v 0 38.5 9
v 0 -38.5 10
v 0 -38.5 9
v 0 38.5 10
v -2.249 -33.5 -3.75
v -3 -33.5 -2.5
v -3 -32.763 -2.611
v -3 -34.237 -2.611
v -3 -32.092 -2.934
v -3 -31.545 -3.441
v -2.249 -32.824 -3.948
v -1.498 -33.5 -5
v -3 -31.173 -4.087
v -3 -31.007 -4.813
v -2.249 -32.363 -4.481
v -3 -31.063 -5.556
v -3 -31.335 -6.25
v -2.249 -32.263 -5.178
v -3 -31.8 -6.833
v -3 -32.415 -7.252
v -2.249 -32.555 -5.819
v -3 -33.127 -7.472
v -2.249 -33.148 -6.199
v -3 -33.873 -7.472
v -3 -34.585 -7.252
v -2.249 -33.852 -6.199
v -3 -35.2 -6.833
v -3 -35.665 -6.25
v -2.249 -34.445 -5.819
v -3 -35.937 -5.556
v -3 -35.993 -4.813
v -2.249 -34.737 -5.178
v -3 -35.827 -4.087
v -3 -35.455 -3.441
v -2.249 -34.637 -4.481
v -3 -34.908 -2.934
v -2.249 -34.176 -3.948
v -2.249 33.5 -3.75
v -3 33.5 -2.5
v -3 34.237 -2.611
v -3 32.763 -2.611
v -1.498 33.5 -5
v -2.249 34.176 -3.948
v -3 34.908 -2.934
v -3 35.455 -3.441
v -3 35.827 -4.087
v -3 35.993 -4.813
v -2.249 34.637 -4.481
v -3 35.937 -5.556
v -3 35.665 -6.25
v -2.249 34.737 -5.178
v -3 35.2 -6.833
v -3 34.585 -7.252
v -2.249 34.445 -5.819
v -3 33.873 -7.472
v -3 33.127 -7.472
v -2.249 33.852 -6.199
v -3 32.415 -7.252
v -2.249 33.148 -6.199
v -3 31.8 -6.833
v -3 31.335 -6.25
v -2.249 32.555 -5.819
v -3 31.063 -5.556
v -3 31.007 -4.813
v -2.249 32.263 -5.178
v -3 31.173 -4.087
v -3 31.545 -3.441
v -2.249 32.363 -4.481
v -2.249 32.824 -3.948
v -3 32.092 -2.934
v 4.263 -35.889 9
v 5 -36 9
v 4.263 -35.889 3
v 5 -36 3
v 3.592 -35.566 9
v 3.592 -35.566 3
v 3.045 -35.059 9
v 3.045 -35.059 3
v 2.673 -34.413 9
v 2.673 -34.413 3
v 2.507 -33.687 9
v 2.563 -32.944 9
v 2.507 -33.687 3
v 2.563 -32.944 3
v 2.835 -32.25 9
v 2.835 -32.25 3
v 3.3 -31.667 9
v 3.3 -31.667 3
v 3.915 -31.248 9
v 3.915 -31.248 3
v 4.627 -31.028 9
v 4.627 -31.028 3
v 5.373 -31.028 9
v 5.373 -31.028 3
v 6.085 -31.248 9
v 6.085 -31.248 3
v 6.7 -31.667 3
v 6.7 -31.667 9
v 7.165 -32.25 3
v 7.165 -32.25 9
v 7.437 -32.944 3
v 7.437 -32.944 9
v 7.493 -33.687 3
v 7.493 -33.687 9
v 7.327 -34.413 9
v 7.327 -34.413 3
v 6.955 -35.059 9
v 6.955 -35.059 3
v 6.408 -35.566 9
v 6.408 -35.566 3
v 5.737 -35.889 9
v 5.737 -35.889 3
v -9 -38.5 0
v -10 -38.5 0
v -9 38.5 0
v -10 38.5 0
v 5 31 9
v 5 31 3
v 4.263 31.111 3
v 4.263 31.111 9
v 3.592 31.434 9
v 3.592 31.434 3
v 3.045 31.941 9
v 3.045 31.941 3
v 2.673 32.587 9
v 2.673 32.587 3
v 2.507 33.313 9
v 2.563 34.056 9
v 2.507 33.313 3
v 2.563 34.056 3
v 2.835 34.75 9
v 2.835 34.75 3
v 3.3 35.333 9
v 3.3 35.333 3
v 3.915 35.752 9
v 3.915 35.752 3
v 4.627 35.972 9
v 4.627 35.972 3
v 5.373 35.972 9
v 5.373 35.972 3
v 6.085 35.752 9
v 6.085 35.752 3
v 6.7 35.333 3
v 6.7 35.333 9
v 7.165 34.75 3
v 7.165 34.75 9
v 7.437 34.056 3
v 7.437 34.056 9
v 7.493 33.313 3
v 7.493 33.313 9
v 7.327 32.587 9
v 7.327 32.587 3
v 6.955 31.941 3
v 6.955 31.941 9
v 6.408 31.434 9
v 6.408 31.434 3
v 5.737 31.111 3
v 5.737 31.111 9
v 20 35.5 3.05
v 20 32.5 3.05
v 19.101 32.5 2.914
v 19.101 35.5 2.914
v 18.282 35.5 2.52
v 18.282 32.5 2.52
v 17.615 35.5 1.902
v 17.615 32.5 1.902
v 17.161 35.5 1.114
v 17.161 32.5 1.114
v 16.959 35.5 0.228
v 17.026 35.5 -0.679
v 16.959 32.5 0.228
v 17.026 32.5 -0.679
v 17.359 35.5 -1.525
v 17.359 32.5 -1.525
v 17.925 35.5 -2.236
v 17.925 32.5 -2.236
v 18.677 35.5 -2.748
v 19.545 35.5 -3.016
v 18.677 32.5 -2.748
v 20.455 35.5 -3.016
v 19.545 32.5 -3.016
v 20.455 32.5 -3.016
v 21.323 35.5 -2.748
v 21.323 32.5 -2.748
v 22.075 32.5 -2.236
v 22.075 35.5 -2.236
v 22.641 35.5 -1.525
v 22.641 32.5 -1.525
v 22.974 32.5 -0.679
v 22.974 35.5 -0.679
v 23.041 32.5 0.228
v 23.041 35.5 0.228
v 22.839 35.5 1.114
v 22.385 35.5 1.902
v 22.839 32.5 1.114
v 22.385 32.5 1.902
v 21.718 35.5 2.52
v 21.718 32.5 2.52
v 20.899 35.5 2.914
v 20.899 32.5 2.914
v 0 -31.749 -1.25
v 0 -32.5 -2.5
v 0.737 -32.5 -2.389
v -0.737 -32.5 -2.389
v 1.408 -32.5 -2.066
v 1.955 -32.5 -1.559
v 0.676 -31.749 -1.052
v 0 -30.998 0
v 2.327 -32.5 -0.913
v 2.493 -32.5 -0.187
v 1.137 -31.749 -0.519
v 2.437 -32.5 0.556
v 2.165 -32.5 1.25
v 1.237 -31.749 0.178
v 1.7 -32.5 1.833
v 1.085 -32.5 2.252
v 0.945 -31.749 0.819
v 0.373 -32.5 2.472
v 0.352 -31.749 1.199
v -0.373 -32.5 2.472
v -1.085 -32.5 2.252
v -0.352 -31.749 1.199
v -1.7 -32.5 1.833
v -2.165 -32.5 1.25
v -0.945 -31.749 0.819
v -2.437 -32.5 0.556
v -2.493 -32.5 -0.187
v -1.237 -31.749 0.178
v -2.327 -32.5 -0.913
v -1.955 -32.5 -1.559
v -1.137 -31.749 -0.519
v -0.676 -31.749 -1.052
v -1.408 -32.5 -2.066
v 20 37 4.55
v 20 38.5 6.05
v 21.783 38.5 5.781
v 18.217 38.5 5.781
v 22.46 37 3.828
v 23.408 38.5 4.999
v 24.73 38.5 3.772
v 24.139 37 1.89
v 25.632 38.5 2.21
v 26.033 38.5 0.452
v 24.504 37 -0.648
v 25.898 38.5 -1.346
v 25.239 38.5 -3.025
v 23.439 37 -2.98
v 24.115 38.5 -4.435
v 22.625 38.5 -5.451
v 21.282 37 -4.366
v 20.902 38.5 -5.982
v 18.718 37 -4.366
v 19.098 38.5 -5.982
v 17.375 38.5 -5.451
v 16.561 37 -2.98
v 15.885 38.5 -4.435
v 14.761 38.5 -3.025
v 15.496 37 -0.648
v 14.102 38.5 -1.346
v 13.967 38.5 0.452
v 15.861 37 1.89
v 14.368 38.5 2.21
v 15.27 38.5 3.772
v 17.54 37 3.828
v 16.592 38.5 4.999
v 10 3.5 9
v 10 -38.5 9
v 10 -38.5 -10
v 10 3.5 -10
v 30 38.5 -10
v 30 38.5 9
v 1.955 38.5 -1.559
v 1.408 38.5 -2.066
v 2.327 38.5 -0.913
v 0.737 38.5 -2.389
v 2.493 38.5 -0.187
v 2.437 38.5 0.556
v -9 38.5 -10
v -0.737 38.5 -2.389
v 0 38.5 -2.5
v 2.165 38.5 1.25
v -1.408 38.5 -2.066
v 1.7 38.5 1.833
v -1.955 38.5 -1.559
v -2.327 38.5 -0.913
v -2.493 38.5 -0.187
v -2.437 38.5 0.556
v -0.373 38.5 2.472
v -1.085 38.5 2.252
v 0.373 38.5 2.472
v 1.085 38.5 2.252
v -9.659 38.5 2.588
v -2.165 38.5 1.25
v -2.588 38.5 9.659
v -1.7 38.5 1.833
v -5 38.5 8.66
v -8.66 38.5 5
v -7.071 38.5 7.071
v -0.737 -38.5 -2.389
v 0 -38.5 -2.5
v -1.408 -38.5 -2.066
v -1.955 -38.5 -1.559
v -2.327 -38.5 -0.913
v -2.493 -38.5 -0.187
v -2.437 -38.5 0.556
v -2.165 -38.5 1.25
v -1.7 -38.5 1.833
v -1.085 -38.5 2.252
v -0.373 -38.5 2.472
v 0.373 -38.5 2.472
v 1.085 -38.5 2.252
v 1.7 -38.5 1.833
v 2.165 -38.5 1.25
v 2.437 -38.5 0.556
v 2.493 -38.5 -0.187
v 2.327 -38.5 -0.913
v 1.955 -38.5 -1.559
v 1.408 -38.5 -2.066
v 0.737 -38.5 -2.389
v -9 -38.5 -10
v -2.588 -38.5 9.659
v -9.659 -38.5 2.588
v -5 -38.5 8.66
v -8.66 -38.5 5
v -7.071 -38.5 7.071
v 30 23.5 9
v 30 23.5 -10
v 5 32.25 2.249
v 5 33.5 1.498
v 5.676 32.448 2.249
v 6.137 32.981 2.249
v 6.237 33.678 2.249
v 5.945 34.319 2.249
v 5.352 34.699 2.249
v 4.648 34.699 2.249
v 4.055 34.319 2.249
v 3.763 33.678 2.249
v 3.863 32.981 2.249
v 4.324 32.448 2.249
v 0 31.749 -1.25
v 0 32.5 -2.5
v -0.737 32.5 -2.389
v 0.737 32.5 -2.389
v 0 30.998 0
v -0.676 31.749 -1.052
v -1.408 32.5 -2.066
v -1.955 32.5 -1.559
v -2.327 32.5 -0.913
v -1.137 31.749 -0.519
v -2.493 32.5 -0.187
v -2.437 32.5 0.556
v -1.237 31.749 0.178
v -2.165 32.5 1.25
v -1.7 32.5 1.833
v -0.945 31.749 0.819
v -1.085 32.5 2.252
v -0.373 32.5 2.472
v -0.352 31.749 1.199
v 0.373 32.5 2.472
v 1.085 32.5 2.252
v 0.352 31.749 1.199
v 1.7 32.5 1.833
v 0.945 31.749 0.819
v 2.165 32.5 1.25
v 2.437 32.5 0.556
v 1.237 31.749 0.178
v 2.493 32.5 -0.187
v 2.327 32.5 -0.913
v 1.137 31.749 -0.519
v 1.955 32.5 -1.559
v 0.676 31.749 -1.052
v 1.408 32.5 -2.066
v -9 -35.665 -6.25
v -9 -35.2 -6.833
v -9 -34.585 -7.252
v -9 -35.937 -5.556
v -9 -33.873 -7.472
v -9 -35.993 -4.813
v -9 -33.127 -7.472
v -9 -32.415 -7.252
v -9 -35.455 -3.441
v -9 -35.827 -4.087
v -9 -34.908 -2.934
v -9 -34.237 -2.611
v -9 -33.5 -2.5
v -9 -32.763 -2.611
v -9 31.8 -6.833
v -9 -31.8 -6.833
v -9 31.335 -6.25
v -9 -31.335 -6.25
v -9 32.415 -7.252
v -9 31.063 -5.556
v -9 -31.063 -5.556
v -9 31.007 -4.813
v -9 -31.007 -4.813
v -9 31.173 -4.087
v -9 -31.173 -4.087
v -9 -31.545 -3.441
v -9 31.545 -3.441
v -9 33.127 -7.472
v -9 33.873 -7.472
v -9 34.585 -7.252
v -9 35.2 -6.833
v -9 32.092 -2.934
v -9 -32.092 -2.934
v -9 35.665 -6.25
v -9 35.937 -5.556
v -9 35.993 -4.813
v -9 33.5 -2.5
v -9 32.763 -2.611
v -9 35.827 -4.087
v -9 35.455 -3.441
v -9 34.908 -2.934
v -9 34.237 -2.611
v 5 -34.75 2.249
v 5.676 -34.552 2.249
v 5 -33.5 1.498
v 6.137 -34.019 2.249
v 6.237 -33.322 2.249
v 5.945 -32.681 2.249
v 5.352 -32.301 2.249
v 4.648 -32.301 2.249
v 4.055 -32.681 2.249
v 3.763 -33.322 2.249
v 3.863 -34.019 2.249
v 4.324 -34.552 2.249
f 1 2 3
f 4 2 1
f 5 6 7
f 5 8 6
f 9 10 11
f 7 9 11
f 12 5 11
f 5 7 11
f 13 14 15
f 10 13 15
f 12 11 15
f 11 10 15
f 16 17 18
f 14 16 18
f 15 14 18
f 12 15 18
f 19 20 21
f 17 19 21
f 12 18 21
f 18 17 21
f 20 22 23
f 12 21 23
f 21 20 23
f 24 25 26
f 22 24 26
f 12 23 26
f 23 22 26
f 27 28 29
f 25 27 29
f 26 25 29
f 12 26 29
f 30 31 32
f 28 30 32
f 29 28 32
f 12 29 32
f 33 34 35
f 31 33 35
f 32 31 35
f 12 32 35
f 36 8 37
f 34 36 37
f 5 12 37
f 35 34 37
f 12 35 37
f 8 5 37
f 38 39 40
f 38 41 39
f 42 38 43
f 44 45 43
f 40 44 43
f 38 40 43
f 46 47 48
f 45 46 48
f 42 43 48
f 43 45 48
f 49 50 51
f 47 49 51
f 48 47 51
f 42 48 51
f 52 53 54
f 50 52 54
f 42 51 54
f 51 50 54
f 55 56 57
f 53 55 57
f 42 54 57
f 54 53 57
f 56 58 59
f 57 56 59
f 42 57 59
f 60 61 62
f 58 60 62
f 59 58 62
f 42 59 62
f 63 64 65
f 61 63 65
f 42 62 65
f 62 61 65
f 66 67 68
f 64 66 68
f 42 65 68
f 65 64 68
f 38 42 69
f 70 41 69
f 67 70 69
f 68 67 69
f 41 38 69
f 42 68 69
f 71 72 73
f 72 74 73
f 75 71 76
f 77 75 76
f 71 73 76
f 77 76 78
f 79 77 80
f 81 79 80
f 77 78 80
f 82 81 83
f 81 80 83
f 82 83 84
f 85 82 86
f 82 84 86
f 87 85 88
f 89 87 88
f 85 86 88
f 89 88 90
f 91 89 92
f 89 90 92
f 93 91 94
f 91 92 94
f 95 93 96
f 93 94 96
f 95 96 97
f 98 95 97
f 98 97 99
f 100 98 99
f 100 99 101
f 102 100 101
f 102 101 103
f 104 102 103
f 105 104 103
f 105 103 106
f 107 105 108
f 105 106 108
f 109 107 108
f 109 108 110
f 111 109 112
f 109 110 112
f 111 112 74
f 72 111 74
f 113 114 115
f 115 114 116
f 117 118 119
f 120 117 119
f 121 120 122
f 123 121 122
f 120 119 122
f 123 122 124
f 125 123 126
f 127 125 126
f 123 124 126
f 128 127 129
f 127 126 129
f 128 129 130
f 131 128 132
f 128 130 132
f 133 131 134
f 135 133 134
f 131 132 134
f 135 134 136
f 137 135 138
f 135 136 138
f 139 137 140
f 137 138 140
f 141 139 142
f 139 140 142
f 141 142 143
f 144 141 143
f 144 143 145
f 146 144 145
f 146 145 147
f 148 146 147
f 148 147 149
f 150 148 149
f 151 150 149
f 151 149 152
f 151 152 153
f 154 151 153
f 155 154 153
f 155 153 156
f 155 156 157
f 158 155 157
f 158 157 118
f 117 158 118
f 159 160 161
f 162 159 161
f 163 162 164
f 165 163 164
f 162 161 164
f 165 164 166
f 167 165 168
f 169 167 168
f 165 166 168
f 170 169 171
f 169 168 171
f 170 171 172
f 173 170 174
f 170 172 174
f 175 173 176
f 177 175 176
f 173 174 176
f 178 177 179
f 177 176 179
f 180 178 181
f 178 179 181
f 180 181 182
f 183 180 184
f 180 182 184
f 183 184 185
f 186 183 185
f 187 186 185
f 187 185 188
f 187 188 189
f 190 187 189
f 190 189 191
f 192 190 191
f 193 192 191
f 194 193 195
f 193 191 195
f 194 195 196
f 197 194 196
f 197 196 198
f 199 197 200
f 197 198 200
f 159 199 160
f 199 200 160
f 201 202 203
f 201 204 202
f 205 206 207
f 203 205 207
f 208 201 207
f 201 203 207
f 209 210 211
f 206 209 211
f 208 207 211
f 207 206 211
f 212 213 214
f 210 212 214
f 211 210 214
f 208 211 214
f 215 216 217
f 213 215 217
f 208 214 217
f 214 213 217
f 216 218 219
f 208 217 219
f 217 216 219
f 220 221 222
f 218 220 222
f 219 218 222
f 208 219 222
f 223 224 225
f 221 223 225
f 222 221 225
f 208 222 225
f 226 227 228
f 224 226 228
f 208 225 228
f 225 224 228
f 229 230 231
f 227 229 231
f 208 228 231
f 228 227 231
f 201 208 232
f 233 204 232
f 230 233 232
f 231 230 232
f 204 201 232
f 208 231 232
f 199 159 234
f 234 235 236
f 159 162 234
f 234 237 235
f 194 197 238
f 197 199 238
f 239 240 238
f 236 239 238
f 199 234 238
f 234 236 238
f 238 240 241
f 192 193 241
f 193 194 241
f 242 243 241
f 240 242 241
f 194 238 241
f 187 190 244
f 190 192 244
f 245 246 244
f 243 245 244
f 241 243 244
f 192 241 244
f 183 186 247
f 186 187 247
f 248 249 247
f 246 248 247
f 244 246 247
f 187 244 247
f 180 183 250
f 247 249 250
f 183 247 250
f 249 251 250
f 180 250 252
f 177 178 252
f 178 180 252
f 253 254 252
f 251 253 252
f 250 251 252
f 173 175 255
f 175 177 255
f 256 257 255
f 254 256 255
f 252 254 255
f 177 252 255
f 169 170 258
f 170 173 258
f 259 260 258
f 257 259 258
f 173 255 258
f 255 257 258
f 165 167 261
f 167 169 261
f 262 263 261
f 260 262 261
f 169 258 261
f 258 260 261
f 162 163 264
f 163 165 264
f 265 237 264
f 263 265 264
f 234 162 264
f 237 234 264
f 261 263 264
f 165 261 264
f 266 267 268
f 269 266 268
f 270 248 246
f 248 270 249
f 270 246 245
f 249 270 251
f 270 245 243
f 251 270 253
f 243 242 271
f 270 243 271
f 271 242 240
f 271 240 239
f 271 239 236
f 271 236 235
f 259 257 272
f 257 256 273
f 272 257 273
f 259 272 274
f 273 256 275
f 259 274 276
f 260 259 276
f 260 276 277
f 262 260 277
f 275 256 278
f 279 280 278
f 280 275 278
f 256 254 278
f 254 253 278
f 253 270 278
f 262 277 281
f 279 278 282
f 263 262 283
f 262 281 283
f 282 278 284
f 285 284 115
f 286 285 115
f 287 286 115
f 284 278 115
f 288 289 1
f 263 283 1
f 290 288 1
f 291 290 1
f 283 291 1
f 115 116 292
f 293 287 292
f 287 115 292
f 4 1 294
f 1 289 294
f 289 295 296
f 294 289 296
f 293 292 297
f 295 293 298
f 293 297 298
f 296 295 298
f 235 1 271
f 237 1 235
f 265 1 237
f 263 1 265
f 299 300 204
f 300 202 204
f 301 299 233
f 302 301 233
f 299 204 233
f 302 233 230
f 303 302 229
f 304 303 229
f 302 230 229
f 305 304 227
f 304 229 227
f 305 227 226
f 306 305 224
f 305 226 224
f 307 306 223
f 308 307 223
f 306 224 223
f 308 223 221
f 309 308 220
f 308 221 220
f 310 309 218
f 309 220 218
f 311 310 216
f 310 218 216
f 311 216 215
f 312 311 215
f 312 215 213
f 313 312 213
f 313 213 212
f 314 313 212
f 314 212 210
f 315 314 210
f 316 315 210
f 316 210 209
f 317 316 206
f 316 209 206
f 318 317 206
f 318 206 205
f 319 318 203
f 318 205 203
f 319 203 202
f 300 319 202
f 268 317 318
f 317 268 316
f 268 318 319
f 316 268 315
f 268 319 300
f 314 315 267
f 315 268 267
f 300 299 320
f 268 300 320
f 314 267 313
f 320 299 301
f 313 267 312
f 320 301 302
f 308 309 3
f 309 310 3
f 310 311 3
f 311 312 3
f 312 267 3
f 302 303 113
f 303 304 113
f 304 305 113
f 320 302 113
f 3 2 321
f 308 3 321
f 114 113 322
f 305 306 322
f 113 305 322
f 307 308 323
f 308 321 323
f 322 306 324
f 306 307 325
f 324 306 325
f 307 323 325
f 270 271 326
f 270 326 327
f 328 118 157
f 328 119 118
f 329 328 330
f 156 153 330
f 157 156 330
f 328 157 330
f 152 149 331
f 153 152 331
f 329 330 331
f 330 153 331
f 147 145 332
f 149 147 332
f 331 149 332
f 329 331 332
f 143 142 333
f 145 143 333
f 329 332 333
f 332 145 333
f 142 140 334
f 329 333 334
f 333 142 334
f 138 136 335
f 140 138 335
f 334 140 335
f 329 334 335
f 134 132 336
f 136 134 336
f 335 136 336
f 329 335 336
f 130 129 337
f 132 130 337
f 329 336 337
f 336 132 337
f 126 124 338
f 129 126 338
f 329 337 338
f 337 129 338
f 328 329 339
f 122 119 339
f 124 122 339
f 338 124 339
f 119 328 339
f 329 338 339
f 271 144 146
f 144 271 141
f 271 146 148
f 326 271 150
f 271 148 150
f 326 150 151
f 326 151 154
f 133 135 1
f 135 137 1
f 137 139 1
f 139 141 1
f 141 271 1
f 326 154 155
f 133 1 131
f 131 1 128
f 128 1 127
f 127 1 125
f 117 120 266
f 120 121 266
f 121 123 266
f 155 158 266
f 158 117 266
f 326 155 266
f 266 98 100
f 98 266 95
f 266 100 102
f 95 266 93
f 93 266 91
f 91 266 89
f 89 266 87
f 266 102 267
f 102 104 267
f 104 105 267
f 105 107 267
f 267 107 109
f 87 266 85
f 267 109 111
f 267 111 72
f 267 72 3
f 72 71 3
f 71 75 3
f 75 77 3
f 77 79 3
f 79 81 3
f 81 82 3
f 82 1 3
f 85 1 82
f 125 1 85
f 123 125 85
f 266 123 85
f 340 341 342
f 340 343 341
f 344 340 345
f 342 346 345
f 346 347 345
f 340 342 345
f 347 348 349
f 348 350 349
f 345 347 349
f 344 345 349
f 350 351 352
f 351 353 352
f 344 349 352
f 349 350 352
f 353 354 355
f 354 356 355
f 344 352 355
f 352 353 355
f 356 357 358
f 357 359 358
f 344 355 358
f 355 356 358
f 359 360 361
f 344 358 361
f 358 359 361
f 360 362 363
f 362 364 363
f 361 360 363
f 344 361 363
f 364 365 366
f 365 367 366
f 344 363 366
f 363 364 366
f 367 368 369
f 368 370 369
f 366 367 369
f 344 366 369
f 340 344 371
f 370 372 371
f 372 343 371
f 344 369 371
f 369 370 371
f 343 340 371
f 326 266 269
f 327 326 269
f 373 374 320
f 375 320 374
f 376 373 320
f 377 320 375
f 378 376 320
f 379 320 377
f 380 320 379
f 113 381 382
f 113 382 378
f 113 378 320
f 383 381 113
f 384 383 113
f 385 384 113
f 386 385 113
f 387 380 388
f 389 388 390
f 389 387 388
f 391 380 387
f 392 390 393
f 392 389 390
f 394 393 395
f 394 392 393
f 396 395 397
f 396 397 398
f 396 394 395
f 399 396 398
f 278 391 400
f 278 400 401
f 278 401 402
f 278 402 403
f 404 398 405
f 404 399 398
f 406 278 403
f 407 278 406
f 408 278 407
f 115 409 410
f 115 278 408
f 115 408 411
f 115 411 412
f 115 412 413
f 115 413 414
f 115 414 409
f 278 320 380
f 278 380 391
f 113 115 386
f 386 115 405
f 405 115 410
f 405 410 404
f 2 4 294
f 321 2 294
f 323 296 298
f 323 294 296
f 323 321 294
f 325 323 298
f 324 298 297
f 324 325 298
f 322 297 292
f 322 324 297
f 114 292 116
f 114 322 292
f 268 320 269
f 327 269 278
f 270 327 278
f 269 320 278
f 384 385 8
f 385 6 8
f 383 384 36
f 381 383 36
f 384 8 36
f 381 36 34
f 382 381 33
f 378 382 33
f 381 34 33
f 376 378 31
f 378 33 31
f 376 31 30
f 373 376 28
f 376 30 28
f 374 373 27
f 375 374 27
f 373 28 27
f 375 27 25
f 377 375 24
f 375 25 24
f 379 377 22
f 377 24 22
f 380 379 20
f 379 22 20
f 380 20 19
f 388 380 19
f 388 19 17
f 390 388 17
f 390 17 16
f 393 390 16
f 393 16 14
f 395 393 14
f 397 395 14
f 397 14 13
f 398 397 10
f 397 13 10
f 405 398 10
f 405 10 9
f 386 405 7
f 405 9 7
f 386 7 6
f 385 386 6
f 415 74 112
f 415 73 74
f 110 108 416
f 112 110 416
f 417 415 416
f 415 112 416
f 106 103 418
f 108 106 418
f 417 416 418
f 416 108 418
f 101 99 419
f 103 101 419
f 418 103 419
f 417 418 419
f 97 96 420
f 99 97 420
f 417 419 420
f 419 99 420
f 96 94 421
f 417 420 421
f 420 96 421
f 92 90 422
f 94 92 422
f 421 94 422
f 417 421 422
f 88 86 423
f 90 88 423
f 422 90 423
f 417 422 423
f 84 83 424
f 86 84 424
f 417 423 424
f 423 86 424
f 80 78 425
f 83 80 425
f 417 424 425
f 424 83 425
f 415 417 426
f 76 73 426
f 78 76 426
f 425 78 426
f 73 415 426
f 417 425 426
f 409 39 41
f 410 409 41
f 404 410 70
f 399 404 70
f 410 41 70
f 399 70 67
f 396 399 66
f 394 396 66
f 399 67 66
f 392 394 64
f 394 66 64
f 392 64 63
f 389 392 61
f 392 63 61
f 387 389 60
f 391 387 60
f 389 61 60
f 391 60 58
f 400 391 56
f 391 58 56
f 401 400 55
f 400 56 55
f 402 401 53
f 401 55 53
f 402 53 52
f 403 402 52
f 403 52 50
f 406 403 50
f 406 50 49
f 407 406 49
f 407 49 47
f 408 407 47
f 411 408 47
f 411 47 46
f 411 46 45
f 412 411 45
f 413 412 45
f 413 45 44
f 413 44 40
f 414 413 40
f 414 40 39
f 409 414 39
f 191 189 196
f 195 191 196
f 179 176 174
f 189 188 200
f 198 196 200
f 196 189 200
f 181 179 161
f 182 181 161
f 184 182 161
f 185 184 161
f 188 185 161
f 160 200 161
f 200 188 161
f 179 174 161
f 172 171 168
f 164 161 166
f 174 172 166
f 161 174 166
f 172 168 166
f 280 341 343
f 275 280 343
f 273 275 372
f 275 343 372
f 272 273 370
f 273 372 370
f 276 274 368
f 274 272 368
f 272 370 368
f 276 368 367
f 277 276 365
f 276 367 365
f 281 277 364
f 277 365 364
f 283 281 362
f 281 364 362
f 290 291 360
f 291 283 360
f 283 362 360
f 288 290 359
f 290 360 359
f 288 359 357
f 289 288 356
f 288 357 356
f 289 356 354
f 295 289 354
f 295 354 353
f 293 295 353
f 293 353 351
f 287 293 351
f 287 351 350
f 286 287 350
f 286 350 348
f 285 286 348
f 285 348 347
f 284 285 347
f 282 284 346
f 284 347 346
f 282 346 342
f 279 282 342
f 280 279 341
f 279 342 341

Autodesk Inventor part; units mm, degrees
ref_plane "YZ Plane" through (0, 0, 0) normal (1, 0, 0) x (0, 1, 0)
ref_plane "XZ Plane" through (0, 0, 0) normal (0, 1, 0) x (-1, 0, 0)
ref_plane "XY Plane" through (0, 0, 0) normal (0, 0, 1) x (1, 0, 0)
sketch "スケッチ1" plane through (0, 0, 0) normal (0, 1, 0) x (-1, 0, 0)
  circle A0 centre (0, 0) radius 10
  line L0 (0, 10) -> (-10, 10)
  line L1 (-10, 10) -> (-10, -10)
  line L2 (-10, -10) -> (10, -10)
  line L3 (10, -10) -> (10, 0)
  dimension "d0" = 20
  dimension "d1" = 10
  dimension "d2" = 10
extrude "押し出し1" add sketch "スケッチ1" along normal mid plane 77
sketch "スケッチ2" plane through (0, -38.5, 10) normal (0, 0, 1) x (1, 0, 0)
  line L0 (10, 0) -> (10, 77) projected
  line L1 (0, 77) -> (10, 77) projected
  line L2 (0, 0) -> (0, 77) projected
  line L3 (10, 0) -> (0, 0) projected
extrude "押し出し2" cut sketch "スケッチ2" against normal blind 1
sketch "スケッチ3" plane through (-10, -38.5, -10) normal (-1, 0, 0) x (0, 0, 1)
  line L0 (0, 77) -> (10, 77) projected
  line L1 (10, 0) -> (10, 77) projected
  line L2 (10, 0) -> (0, 0) projected
  line L3 (0, 0) -> (0, 77) projected
  point P0 (10, 38.5)
extrude "押し出し3" cut sketch "スケッチ3" against normal blind 1
sketch "スケッチ4" plane through (0, -38.5, 9) normal (0, 0, 1) x (1, 0, 0)
  line L0 (0, 77) -> (10, 77) projected
  line L1 (10, 77) -> (10, 0) projected
  line L2 (10, 0) -> (0, 0) projected
  point P0 (0, 38.5)
  point P1 (5, 72)
  point P2 (5, 5)
  dimension "d9" = 5
  dimension "d10" = 5
  dimension "d11" = 5
hole "穴1" at (5, 33.5, 9) at (5, -33.5, 9) direction (0, 0, -1) diameter 5 depth 6 tip angle 118
sketch "スケッチ5" plane through (0, -38.5, 0) normal (0, 1, 0) x (1, 0, 0)
  point P0 (0, 0)
hole "穴2" at (0, -38.5, 0) direction (0, 1, 0) diameter 5 depth 6 tip angle 118
sketch "スケッチ6" plane through (-9, -38.5, -10) normal (-1, 0, 0) x (0, 0, 1)
  line L0 (0, 0) -> (0, 77) projected
  line L1 (0, 77) -> (10, 77) projected
  line L2 (10, 0) -> (0, 0) projected
  point P0 (10, 38.5)
  point P1 (5, 72)
  point P2 (5, 5)
  dimension "d26" = 5
  dimension "d27" = 5
  dimension "d28" = 5
  dimension "d29" = 5
hole "穴3" at (-9, 33.5, -5) at (-9, -33.5, -5) direction (1, 0, 0) diameter 5 depth 6 tip angle 118
mirror "ミラー1" about plane through (0, 0, 0) normal (0, 1, 0) of "穴2"
sketch "スケッチ9" plane through (10, -38.5, -10) normal (1, 0, 0) x (0, 0, -1)
  line L0 (0, 77) -> (-10, 77) projected
  line L1 (-19, 77) -> (-19, 0) projected
  line L2 (0, 77) -> (-19, 77)
  line L3 (-19, 77) -> (-19, 62)
  line L4 (-19, 62) -> (0, 62)
  line L5 (0, 62) -> (0, 77)
  point P0 (-10, 38.5)
  dimension "d47" = 15
extrude "押し出し6" add sketch "スケッチ9" along normal blind 20
sketch "スケッチ10" plane through (0, 38.5, 0) normal (0, 1, 0) x (1, 0, 0)
  line L0 (30, 10) -> (30, -9) projected
  point P0 (0, 0)
  point P1 (20, 0)
  dimension "d50" = 10
hole "穴4" at (20, 38.5, 0) direction (0, -1, 0) diameter 6.1 depth 6
chamfer "面取り2" distance 3 angle 45 1 edges at (20, 38.5, -3.05)
chamfer "面取り3" distance 20 angle 45 1 edges at (10, 23.5, -0.5)
equation "\"d11\" = d9"
properties part number "base8" material "ABS プラスチック"
